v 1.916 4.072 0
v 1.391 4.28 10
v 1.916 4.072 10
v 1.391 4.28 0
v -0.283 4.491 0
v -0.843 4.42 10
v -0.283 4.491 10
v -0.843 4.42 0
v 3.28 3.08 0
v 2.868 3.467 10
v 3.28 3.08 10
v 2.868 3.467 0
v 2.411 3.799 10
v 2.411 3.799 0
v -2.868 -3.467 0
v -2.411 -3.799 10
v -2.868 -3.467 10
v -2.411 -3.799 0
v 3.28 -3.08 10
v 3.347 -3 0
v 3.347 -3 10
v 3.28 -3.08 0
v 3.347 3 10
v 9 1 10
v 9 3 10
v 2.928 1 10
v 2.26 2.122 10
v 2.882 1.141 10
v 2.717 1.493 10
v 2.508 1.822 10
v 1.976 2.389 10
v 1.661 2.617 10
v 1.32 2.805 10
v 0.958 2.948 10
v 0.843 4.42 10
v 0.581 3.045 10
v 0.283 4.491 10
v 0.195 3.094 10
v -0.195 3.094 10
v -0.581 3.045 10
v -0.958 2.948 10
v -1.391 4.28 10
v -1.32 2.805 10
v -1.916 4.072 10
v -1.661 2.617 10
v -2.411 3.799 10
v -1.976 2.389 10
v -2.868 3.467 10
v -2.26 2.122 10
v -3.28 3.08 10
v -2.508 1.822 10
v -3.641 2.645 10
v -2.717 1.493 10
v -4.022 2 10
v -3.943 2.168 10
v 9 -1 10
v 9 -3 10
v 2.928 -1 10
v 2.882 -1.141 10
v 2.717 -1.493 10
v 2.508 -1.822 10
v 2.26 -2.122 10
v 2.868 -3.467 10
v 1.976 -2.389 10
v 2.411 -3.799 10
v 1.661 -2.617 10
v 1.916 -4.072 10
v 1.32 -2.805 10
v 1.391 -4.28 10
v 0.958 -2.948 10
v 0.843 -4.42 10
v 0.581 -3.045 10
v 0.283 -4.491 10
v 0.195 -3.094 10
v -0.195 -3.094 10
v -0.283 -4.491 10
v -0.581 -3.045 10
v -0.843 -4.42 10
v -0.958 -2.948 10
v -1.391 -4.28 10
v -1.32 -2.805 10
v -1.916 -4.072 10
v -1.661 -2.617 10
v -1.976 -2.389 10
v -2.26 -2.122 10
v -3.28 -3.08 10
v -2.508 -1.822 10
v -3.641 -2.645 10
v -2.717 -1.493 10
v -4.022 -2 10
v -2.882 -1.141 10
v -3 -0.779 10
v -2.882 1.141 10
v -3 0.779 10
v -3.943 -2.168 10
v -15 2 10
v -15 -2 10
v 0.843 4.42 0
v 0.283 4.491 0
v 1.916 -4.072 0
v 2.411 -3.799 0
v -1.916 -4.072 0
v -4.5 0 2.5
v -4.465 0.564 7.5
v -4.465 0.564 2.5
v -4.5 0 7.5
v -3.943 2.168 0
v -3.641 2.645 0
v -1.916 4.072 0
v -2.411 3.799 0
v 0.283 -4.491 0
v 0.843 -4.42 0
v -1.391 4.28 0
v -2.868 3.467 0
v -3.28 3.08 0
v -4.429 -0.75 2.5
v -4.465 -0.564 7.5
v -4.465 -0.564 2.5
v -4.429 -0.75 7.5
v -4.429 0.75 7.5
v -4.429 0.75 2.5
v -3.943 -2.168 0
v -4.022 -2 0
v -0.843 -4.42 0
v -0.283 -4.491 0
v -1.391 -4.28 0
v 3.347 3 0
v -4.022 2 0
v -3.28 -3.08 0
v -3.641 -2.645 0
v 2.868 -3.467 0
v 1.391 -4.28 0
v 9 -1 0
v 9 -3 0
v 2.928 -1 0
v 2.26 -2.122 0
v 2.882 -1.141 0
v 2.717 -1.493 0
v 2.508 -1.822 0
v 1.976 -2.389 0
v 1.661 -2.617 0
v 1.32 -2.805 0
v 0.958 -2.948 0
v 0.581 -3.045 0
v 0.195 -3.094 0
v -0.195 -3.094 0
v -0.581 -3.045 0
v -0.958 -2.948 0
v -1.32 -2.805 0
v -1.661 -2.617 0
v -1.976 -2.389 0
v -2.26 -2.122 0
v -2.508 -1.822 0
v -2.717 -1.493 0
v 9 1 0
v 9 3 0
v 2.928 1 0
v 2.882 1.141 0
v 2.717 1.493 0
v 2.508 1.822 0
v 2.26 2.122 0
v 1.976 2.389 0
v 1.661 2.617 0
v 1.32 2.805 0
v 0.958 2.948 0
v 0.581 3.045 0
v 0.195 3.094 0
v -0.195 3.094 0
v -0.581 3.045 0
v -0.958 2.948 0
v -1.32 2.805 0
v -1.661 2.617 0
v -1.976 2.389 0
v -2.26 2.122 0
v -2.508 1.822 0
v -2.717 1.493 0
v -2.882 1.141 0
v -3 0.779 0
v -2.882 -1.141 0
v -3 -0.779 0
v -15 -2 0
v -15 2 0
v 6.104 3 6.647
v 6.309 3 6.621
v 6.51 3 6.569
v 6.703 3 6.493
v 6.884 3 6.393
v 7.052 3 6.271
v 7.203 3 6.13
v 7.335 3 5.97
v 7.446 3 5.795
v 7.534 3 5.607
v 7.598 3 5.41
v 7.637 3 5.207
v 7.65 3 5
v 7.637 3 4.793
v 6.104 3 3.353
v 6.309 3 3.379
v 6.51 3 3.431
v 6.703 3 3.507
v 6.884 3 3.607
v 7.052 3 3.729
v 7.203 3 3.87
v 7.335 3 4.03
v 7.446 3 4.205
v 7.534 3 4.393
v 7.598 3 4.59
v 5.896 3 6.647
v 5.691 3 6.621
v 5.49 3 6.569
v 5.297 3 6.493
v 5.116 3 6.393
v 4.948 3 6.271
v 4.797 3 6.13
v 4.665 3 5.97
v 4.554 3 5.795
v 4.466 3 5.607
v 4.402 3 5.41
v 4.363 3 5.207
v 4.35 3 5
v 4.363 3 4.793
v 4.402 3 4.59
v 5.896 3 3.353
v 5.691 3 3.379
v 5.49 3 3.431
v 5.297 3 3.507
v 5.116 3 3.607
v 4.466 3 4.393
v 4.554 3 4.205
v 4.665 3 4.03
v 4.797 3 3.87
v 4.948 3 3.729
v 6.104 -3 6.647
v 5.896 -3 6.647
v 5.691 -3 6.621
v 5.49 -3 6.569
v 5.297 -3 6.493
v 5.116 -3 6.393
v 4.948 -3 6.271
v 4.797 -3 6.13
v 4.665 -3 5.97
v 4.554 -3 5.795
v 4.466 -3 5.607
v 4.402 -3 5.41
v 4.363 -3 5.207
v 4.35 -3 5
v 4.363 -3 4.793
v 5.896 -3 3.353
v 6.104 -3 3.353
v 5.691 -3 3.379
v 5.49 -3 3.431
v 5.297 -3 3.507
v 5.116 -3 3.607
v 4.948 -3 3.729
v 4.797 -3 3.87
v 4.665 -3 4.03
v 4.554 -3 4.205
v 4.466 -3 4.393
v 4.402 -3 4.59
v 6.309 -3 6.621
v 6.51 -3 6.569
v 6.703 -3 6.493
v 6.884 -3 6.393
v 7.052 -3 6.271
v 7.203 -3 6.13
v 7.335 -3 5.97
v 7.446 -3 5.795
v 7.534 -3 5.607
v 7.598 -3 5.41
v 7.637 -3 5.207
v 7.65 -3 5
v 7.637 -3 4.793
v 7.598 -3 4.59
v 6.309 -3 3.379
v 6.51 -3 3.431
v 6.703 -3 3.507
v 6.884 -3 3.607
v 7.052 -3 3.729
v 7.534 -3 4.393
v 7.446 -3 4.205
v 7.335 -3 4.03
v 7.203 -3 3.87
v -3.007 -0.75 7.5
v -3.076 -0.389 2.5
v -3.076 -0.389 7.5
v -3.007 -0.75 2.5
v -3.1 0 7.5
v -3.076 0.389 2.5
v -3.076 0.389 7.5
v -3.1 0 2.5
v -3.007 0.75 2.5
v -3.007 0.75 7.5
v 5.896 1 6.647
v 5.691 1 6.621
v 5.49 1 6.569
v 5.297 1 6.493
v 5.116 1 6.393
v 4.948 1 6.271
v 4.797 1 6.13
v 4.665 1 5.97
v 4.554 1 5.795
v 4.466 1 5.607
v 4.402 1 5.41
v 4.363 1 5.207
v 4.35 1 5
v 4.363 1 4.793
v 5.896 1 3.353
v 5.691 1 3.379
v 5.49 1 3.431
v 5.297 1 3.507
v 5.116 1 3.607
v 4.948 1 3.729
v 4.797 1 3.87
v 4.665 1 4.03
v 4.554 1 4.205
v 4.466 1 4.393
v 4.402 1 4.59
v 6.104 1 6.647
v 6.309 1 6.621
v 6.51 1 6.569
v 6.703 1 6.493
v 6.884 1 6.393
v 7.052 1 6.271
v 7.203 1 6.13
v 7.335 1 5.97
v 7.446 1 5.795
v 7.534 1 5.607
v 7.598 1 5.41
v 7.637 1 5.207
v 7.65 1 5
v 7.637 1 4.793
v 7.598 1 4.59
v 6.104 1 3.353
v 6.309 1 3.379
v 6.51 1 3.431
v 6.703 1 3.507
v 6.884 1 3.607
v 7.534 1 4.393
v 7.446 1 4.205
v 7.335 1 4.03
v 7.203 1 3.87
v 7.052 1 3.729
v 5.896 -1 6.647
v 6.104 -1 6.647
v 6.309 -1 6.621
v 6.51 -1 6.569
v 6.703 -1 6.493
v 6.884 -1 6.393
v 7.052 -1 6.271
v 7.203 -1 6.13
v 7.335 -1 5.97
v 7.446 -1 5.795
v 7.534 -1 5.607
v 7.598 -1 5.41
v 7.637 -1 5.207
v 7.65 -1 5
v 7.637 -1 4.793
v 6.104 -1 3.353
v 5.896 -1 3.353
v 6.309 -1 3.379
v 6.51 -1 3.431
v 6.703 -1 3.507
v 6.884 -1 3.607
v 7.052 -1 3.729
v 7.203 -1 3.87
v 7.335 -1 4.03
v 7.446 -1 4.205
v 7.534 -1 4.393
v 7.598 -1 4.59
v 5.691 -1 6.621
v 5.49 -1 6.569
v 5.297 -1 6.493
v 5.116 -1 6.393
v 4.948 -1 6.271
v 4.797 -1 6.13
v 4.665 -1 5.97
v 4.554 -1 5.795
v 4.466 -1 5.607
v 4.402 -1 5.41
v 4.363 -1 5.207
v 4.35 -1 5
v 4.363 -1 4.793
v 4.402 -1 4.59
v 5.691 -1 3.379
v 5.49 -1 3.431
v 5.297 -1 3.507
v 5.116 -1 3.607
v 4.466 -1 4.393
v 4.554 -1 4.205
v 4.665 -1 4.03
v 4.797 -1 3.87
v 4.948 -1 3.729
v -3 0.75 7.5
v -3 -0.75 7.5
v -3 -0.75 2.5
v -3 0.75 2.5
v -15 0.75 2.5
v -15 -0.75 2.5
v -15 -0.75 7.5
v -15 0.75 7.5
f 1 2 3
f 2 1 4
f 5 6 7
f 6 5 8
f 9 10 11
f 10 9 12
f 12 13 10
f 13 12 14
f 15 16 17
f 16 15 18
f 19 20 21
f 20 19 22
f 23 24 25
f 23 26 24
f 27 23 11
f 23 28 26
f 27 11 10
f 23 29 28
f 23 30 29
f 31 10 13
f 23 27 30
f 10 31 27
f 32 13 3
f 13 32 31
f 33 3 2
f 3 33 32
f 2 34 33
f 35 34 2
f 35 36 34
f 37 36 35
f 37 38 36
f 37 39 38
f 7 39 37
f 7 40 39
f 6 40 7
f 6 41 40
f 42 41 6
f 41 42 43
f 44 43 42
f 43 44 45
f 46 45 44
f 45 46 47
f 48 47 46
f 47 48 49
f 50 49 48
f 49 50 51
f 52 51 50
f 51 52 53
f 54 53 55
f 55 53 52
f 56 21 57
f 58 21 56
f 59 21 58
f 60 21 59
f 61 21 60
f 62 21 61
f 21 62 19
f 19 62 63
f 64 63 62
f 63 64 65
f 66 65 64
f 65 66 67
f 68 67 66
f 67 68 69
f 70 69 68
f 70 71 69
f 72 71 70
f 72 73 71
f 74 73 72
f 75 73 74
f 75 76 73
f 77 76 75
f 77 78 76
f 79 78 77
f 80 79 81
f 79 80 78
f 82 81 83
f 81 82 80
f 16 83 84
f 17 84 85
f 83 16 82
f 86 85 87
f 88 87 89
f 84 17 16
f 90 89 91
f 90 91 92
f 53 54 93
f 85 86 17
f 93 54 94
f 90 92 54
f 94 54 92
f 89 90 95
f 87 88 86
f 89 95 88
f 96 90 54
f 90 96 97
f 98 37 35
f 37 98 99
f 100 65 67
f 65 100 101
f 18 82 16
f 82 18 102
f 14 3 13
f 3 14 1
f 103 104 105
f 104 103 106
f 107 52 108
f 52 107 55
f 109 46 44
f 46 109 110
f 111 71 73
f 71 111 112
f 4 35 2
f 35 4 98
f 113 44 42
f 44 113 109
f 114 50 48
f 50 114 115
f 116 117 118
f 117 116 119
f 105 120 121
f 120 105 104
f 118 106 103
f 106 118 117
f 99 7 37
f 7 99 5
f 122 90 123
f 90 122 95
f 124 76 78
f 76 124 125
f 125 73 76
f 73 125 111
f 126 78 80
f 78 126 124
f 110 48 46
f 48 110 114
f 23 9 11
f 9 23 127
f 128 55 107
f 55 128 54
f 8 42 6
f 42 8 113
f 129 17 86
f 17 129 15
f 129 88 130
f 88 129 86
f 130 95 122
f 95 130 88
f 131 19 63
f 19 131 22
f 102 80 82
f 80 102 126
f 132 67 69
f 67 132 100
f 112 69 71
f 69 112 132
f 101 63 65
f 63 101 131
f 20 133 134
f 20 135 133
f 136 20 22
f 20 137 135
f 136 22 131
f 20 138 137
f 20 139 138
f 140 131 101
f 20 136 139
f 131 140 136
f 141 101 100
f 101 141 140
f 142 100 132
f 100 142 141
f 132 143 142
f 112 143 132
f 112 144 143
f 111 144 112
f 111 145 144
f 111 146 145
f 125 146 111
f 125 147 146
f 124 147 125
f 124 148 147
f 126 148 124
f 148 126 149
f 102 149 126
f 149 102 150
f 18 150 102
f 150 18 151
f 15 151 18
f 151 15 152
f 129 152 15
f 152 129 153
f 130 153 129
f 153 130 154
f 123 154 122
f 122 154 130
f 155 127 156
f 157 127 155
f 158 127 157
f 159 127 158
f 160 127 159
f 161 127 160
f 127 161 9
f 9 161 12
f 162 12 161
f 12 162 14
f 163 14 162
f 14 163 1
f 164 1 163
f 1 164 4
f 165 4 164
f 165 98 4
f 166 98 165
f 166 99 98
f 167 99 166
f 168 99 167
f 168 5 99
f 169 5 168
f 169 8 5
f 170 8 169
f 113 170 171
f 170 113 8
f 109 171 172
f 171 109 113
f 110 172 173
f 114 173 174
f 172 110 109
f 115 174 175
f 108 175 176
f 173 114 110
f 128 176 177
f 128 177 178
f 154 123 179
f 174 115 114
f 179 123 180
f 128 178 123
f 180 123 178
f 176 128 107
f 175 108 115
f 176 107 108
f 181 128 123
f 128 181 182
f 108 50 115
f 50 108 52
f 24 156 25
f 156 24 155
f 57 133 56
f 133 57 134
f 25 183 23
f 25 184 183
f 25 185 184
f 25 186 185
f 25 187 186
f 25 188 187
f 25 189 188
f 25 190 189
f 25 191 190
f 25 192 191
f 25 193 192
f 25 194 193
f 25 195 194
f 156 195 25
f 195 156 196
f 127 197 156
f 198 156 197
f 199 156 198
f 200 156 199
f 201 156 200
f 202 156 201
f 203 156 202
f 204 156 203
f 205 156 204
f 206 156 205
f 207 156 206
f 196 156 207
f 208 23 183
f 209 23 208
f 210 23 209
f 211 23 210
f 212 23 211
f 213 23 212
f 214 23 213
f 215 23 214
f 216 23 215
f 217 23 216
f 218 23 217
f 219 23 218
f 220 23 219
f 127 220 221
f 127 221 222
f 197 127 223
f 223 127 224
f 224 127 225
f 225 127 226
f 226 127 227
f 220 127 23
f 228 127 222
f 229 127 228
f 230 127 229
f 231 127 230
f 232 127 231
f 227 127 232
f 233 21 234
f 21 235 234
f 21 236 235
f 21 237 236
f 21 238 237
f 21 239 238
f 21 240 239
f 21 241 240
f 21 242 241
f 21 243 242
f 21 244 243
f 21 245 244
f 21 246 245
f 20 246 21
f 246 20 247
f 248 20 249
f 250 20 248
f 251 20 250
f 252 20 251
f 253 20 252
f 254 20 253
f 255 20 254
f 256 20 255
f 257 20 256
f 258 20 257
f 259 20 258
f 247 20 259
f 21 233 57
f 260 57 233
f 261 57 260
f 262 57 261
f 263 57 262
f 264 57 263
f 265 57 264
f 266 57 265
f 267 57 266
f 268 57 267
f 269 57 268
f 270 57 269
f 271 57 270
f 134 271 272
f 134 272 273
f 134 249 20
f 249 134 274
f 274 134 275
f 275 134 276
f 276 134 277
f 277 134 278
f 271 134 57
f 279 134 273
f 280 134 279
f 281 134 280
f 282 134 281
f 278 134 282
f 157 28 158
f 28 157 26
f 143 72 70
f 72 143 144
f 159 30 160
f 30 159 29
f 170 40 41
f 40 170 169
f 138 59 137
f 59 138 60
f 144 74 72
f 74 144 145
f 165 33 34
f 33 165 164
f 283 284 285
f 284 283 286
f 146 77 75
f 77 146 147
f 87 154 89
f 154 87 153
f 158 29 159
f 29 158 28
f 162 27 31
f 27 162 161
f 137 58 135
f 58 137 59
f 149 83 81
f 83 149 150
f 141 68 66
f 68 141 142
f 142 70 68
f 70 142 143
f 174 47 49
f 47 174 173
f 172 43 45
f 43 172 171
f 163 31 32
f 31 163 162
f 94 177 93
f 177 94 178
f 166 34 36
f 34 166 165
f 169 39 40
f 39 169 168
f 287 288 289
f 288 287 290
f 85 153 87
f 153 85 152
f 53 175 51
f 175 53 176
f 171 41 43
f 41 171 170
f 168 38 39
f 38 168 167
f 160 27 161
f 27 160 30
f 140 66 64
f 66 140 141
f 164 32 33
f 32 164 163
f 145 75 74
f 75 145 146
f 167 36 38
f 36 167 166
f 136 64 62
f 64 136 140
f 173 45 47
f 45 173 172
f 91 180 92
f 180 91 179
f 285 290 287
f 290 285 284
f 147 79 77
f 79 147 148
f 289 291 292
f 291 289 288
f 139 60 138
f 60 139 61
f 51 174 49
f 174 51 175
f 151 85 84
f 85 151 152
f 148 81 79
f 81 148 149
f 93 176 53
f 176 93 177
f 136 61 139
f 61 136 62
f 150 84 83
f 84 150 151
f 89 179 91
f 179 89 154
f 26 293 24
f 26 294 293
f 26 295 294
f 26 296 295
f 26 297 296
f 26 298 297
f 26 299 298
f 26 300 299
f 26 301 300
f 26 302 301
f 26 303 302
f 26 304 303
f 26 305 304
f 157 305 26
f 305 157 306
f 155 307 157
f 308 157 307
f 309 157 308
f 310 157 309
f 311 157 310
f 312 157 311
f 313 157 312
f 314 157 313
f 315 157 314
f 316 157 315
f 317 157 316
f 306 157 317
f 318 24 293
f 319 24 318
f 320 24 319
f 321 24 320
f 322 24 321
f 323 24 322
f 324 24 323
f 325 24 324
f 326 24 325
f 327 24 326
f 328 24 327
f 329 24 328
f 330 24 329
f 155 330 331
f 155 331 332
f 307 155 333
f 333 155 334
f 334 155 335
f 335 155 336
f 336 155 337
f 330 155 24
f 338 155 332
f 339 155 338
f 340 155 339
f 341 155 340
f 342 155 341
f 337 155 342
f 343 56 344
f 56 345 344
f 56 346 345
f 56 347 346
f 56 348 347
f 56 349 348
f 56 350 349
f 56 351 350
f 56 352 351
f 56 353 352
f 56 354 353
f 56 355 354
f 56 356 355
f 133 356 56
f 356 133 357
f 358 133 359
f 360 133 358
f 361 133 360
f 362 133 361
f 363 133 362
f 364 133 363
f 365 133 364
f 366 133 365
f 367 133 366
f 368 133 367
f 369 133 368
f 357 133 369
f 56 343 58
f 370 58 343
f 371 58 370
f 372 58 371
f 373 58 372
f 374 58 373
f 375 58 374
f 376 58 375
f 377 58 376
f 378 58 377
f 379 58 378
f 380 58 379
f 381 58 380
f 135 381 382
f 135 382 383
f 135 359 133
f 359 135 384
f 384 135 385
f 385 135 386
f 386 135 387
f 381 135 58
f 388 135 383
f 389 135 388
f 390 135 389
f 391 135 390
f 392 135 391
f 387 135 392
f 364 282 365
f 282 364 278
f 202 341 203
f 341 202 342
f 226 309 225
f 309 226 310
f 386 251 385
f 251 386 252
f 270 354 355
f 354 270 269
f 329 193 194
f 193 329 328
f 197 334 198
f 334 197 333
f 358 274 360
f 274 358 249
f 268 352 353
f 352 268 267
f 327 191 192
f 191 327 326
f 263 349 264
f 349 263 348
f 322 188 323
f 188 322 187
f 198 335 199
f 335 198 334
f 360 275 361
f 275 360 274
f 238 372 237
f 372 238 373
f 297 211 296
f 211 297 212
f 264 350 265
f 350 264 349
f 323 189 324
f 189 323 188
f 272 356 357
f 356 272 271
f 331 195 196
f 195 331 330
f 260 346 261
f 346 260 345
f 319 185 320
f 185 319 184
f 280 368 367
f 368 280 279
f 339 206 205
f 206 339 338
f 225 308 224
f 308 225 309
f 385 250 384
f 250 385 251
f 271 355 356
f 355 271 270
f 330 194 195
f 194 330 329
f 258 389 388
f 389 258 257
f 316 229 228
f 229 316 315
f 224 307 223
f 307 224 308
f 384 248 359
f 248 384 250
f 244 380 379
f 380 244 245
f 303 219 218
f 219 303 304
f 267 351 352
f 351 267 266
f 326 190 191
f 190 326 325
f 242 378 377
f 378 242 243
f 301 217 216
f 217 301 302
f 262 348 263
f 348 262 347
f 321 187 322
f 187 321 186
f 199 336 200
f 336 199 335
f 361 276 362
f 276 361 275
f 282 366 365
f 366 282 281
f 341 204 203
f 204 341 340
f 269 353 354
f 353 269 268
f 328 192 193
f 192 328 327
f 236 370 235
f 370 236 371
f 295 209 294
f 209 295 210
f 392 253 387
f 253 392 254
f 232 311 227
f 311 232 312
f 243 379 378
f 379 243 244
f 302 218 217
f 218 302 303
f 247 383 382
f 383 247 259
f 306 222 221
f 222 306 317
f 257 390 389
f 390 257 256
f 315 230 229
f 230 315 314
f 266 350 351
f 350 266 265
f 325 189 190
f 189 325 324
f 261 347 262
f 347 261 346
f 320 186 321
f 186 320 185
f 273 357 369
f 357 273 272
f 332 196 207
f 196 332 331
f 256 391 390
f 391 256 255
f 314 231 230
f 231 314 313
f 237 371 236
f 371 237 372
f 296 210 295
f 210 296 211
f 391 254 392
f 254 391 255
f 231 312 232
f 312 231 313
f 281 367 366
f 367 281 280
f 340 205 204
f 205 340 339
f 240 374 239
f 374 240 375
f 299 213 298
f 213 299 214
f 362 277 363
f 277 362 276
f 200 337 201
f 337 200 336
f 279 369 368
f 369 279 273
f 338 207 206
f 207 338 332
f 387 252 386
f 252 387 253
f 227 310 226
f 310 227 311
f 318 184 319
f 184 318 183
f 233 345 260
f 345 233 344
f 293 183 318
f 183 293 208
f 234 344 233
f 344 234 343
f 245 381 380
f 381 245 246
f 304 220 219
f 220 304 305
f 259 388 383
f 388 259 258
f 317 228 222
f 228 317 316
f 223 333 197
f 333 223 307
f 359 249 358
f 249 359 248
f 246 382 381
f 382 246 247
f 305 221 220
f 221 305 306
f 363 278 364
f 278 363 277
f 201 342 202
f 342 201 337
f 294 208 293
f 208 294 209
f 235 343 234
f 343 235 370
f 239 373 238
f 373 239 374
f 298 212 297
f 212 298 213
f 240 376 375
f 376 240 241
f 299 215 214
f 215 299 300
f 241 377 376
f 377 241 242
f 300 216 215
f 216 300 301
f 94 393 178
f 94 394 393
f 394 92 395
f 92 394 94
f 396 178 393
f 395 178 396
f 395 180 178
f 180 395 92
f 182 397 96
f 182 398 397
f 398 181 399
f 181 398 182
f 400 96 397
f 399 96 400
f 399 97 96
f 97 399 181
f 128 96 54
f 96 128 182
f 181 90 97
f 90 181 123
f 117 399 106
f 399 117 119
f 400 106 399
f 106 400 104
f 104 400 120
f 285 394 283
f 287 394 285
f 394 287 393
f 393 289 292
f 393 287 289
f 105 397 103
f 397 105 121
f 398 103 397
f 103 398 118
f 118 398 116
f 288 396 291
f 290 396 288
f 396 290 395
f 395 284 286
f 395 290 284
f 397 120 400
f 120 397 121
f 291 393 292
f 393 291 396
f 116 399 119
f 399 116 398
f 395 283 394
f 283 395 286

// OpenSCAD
// Pins for holding the difference potentiometers

$fn = 50;

module clamp(width) {
   difference() {
      union() {
         cylinder(h=width, d=9);
         translate([0, -3, 0])
            cube([9, 4+2, width]);
      }
      translate([0, 0, -1])
         cylinder(h=width+2, d=6.2);
      translate([1, -1, -1])
         cube([width+2, 2, width+2]);
      translate([6, 5, width/2])
         rotate([90, 0, 0])
            cylinder(h=width+2, d=3.3);
   }
}

module clamp_slider() {
   clamp(10);
   translate([-15, -2, 0]) {
      difference() {
         cube([12, 4, 10]);
         translate([-1, 1.25, 2.5])
            cube([15, 1.5, 5]);
      }
   }
}

// clamp(8); // Make module plain

clamp_slider(); // Make module slider
